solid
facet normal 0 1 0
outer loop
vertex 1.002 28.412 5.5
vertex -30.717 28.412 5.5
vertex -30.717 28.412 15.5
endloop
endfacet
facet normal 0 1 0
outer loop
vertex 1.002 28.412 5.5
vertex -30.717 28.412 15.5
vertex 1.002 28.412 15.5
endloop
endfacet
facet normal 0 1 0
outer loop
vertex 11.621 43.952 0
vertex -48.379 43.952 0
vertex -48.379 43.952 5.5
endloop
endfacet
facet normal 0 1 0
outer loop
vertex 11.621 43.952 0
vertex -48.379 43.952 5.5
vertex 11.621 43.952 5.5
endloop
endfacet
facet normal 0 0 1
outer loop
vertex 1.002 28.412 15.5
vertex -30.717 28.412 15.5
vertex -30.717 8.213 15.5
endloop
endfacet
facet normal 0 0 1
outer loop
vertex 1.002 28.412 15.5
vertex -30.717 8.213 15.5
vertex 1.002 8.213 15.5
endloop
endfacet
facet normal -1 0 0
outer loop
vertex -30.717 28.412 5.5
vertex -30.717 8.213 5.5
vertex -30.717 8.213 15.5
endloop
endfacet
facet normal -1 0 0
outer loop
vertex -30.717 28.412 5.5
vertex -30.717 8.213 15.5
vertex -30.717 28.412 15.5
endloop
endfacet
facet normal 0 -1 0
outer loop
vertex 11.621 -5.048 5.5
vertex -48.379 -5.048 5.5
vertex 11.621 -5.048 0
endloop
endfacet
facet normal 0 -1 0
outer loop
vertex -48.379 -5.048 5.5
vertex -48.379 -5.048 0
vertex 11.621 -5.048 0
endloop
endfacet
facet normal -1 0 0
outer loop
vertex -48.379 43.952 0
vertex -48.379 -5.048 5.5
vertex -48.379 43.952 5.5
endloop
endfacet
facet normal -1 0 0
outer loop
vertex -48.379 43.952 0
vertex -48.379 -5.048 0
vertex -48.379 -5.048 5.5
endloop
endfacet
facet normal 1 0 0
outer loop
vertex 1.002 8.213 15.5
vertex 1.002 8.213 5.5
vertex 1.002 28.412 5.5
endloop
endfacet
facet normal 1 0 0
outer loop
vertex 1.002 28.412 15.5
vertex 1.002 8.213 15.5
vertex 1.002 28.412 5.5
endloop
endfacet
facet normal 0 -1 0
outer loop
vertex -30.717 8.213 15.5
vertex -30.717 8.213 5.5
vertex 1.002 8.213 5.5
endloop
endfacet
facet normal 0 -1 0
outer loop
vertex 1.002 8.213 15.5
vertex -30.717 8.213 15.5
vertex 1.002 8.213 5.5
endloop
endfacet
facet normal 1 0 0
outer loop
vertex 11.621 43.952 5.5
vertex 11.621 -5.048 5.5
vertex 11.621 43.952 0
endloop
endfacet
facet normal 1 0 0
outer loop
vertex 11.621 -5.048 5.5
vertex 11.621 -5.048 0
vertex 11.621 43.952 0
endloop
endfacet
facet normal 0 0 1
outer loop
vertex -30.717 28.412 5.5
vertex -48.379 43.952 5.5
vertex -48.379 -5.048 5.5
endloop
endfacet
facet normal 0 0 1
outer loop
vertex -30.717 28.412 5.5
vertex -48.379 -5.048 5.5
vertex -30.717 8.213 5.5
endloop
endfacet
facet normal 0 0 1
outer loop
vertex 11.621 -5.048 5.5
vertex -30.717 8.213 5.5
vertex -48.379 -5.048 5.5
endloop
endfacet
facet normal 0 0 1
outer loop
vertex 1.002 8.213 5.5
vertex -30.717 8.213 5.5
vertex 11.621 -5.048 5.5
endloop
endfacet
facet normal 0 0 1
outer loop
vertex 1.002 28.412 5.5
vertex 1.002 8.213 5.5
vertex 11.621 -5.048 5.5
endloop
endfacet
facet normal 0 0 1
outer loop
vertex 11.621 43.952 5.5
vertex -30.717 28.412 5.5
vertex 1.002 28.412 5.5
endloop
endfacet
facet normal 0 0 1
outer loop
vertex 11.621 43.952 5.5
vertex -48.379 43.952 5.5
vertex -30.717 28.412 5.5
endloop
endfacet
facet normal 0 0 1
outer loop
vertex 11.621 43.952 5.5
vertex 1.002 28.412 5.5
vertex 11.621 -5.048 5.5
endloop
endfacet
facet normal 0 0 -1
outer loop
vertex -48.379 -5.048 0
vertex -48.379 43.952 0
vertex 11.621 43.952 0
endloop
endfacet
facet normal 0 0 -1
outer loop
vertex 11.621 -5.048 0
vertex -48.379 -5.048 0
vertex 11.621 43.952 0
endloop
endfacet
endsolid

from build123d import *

# Parameters (mm, degrees)
F0_W      = 60
F0_H      = 49
F1_DEPTH  = 2.5
F1_FACE_W = 60
F1_FACE_H = 49
F2_DEPTH  = 3
F3_W      = 31.719639
F3_H      = 20.199234
F4_DEPTH  = 10


with BuildPart() as f1:
    # F0 (on Top) → F1 (new body)
    with BuildSketch(Plane.XY):
        with Locations((-18.378621, 19.452427)):
            Rectangle(F0_W, F0_H)
    extrude(amount=F1_DEPTH)

    # F1_face (on face) → F2 (join)
    with BuildSketch(Plane(origin=(-18.378621, 19.452427, 2.5), x_dir=(1, 0, 0), z_dir=(0, 0, 1))):
        Rectangle(F1_FACE_W, F1_FACE_H)
    extrude(amount=F2_DEPTH)

    # F3 (on face) → F4 (join)
    with BuildSketch(Plane.XY.offset(5.5)):
        with Locations((-14.857512, 18.312792)):
            Rectangle(F3_W, F3_H)
    extrude(amount=F4_DEPTH)


solid = f1.part
